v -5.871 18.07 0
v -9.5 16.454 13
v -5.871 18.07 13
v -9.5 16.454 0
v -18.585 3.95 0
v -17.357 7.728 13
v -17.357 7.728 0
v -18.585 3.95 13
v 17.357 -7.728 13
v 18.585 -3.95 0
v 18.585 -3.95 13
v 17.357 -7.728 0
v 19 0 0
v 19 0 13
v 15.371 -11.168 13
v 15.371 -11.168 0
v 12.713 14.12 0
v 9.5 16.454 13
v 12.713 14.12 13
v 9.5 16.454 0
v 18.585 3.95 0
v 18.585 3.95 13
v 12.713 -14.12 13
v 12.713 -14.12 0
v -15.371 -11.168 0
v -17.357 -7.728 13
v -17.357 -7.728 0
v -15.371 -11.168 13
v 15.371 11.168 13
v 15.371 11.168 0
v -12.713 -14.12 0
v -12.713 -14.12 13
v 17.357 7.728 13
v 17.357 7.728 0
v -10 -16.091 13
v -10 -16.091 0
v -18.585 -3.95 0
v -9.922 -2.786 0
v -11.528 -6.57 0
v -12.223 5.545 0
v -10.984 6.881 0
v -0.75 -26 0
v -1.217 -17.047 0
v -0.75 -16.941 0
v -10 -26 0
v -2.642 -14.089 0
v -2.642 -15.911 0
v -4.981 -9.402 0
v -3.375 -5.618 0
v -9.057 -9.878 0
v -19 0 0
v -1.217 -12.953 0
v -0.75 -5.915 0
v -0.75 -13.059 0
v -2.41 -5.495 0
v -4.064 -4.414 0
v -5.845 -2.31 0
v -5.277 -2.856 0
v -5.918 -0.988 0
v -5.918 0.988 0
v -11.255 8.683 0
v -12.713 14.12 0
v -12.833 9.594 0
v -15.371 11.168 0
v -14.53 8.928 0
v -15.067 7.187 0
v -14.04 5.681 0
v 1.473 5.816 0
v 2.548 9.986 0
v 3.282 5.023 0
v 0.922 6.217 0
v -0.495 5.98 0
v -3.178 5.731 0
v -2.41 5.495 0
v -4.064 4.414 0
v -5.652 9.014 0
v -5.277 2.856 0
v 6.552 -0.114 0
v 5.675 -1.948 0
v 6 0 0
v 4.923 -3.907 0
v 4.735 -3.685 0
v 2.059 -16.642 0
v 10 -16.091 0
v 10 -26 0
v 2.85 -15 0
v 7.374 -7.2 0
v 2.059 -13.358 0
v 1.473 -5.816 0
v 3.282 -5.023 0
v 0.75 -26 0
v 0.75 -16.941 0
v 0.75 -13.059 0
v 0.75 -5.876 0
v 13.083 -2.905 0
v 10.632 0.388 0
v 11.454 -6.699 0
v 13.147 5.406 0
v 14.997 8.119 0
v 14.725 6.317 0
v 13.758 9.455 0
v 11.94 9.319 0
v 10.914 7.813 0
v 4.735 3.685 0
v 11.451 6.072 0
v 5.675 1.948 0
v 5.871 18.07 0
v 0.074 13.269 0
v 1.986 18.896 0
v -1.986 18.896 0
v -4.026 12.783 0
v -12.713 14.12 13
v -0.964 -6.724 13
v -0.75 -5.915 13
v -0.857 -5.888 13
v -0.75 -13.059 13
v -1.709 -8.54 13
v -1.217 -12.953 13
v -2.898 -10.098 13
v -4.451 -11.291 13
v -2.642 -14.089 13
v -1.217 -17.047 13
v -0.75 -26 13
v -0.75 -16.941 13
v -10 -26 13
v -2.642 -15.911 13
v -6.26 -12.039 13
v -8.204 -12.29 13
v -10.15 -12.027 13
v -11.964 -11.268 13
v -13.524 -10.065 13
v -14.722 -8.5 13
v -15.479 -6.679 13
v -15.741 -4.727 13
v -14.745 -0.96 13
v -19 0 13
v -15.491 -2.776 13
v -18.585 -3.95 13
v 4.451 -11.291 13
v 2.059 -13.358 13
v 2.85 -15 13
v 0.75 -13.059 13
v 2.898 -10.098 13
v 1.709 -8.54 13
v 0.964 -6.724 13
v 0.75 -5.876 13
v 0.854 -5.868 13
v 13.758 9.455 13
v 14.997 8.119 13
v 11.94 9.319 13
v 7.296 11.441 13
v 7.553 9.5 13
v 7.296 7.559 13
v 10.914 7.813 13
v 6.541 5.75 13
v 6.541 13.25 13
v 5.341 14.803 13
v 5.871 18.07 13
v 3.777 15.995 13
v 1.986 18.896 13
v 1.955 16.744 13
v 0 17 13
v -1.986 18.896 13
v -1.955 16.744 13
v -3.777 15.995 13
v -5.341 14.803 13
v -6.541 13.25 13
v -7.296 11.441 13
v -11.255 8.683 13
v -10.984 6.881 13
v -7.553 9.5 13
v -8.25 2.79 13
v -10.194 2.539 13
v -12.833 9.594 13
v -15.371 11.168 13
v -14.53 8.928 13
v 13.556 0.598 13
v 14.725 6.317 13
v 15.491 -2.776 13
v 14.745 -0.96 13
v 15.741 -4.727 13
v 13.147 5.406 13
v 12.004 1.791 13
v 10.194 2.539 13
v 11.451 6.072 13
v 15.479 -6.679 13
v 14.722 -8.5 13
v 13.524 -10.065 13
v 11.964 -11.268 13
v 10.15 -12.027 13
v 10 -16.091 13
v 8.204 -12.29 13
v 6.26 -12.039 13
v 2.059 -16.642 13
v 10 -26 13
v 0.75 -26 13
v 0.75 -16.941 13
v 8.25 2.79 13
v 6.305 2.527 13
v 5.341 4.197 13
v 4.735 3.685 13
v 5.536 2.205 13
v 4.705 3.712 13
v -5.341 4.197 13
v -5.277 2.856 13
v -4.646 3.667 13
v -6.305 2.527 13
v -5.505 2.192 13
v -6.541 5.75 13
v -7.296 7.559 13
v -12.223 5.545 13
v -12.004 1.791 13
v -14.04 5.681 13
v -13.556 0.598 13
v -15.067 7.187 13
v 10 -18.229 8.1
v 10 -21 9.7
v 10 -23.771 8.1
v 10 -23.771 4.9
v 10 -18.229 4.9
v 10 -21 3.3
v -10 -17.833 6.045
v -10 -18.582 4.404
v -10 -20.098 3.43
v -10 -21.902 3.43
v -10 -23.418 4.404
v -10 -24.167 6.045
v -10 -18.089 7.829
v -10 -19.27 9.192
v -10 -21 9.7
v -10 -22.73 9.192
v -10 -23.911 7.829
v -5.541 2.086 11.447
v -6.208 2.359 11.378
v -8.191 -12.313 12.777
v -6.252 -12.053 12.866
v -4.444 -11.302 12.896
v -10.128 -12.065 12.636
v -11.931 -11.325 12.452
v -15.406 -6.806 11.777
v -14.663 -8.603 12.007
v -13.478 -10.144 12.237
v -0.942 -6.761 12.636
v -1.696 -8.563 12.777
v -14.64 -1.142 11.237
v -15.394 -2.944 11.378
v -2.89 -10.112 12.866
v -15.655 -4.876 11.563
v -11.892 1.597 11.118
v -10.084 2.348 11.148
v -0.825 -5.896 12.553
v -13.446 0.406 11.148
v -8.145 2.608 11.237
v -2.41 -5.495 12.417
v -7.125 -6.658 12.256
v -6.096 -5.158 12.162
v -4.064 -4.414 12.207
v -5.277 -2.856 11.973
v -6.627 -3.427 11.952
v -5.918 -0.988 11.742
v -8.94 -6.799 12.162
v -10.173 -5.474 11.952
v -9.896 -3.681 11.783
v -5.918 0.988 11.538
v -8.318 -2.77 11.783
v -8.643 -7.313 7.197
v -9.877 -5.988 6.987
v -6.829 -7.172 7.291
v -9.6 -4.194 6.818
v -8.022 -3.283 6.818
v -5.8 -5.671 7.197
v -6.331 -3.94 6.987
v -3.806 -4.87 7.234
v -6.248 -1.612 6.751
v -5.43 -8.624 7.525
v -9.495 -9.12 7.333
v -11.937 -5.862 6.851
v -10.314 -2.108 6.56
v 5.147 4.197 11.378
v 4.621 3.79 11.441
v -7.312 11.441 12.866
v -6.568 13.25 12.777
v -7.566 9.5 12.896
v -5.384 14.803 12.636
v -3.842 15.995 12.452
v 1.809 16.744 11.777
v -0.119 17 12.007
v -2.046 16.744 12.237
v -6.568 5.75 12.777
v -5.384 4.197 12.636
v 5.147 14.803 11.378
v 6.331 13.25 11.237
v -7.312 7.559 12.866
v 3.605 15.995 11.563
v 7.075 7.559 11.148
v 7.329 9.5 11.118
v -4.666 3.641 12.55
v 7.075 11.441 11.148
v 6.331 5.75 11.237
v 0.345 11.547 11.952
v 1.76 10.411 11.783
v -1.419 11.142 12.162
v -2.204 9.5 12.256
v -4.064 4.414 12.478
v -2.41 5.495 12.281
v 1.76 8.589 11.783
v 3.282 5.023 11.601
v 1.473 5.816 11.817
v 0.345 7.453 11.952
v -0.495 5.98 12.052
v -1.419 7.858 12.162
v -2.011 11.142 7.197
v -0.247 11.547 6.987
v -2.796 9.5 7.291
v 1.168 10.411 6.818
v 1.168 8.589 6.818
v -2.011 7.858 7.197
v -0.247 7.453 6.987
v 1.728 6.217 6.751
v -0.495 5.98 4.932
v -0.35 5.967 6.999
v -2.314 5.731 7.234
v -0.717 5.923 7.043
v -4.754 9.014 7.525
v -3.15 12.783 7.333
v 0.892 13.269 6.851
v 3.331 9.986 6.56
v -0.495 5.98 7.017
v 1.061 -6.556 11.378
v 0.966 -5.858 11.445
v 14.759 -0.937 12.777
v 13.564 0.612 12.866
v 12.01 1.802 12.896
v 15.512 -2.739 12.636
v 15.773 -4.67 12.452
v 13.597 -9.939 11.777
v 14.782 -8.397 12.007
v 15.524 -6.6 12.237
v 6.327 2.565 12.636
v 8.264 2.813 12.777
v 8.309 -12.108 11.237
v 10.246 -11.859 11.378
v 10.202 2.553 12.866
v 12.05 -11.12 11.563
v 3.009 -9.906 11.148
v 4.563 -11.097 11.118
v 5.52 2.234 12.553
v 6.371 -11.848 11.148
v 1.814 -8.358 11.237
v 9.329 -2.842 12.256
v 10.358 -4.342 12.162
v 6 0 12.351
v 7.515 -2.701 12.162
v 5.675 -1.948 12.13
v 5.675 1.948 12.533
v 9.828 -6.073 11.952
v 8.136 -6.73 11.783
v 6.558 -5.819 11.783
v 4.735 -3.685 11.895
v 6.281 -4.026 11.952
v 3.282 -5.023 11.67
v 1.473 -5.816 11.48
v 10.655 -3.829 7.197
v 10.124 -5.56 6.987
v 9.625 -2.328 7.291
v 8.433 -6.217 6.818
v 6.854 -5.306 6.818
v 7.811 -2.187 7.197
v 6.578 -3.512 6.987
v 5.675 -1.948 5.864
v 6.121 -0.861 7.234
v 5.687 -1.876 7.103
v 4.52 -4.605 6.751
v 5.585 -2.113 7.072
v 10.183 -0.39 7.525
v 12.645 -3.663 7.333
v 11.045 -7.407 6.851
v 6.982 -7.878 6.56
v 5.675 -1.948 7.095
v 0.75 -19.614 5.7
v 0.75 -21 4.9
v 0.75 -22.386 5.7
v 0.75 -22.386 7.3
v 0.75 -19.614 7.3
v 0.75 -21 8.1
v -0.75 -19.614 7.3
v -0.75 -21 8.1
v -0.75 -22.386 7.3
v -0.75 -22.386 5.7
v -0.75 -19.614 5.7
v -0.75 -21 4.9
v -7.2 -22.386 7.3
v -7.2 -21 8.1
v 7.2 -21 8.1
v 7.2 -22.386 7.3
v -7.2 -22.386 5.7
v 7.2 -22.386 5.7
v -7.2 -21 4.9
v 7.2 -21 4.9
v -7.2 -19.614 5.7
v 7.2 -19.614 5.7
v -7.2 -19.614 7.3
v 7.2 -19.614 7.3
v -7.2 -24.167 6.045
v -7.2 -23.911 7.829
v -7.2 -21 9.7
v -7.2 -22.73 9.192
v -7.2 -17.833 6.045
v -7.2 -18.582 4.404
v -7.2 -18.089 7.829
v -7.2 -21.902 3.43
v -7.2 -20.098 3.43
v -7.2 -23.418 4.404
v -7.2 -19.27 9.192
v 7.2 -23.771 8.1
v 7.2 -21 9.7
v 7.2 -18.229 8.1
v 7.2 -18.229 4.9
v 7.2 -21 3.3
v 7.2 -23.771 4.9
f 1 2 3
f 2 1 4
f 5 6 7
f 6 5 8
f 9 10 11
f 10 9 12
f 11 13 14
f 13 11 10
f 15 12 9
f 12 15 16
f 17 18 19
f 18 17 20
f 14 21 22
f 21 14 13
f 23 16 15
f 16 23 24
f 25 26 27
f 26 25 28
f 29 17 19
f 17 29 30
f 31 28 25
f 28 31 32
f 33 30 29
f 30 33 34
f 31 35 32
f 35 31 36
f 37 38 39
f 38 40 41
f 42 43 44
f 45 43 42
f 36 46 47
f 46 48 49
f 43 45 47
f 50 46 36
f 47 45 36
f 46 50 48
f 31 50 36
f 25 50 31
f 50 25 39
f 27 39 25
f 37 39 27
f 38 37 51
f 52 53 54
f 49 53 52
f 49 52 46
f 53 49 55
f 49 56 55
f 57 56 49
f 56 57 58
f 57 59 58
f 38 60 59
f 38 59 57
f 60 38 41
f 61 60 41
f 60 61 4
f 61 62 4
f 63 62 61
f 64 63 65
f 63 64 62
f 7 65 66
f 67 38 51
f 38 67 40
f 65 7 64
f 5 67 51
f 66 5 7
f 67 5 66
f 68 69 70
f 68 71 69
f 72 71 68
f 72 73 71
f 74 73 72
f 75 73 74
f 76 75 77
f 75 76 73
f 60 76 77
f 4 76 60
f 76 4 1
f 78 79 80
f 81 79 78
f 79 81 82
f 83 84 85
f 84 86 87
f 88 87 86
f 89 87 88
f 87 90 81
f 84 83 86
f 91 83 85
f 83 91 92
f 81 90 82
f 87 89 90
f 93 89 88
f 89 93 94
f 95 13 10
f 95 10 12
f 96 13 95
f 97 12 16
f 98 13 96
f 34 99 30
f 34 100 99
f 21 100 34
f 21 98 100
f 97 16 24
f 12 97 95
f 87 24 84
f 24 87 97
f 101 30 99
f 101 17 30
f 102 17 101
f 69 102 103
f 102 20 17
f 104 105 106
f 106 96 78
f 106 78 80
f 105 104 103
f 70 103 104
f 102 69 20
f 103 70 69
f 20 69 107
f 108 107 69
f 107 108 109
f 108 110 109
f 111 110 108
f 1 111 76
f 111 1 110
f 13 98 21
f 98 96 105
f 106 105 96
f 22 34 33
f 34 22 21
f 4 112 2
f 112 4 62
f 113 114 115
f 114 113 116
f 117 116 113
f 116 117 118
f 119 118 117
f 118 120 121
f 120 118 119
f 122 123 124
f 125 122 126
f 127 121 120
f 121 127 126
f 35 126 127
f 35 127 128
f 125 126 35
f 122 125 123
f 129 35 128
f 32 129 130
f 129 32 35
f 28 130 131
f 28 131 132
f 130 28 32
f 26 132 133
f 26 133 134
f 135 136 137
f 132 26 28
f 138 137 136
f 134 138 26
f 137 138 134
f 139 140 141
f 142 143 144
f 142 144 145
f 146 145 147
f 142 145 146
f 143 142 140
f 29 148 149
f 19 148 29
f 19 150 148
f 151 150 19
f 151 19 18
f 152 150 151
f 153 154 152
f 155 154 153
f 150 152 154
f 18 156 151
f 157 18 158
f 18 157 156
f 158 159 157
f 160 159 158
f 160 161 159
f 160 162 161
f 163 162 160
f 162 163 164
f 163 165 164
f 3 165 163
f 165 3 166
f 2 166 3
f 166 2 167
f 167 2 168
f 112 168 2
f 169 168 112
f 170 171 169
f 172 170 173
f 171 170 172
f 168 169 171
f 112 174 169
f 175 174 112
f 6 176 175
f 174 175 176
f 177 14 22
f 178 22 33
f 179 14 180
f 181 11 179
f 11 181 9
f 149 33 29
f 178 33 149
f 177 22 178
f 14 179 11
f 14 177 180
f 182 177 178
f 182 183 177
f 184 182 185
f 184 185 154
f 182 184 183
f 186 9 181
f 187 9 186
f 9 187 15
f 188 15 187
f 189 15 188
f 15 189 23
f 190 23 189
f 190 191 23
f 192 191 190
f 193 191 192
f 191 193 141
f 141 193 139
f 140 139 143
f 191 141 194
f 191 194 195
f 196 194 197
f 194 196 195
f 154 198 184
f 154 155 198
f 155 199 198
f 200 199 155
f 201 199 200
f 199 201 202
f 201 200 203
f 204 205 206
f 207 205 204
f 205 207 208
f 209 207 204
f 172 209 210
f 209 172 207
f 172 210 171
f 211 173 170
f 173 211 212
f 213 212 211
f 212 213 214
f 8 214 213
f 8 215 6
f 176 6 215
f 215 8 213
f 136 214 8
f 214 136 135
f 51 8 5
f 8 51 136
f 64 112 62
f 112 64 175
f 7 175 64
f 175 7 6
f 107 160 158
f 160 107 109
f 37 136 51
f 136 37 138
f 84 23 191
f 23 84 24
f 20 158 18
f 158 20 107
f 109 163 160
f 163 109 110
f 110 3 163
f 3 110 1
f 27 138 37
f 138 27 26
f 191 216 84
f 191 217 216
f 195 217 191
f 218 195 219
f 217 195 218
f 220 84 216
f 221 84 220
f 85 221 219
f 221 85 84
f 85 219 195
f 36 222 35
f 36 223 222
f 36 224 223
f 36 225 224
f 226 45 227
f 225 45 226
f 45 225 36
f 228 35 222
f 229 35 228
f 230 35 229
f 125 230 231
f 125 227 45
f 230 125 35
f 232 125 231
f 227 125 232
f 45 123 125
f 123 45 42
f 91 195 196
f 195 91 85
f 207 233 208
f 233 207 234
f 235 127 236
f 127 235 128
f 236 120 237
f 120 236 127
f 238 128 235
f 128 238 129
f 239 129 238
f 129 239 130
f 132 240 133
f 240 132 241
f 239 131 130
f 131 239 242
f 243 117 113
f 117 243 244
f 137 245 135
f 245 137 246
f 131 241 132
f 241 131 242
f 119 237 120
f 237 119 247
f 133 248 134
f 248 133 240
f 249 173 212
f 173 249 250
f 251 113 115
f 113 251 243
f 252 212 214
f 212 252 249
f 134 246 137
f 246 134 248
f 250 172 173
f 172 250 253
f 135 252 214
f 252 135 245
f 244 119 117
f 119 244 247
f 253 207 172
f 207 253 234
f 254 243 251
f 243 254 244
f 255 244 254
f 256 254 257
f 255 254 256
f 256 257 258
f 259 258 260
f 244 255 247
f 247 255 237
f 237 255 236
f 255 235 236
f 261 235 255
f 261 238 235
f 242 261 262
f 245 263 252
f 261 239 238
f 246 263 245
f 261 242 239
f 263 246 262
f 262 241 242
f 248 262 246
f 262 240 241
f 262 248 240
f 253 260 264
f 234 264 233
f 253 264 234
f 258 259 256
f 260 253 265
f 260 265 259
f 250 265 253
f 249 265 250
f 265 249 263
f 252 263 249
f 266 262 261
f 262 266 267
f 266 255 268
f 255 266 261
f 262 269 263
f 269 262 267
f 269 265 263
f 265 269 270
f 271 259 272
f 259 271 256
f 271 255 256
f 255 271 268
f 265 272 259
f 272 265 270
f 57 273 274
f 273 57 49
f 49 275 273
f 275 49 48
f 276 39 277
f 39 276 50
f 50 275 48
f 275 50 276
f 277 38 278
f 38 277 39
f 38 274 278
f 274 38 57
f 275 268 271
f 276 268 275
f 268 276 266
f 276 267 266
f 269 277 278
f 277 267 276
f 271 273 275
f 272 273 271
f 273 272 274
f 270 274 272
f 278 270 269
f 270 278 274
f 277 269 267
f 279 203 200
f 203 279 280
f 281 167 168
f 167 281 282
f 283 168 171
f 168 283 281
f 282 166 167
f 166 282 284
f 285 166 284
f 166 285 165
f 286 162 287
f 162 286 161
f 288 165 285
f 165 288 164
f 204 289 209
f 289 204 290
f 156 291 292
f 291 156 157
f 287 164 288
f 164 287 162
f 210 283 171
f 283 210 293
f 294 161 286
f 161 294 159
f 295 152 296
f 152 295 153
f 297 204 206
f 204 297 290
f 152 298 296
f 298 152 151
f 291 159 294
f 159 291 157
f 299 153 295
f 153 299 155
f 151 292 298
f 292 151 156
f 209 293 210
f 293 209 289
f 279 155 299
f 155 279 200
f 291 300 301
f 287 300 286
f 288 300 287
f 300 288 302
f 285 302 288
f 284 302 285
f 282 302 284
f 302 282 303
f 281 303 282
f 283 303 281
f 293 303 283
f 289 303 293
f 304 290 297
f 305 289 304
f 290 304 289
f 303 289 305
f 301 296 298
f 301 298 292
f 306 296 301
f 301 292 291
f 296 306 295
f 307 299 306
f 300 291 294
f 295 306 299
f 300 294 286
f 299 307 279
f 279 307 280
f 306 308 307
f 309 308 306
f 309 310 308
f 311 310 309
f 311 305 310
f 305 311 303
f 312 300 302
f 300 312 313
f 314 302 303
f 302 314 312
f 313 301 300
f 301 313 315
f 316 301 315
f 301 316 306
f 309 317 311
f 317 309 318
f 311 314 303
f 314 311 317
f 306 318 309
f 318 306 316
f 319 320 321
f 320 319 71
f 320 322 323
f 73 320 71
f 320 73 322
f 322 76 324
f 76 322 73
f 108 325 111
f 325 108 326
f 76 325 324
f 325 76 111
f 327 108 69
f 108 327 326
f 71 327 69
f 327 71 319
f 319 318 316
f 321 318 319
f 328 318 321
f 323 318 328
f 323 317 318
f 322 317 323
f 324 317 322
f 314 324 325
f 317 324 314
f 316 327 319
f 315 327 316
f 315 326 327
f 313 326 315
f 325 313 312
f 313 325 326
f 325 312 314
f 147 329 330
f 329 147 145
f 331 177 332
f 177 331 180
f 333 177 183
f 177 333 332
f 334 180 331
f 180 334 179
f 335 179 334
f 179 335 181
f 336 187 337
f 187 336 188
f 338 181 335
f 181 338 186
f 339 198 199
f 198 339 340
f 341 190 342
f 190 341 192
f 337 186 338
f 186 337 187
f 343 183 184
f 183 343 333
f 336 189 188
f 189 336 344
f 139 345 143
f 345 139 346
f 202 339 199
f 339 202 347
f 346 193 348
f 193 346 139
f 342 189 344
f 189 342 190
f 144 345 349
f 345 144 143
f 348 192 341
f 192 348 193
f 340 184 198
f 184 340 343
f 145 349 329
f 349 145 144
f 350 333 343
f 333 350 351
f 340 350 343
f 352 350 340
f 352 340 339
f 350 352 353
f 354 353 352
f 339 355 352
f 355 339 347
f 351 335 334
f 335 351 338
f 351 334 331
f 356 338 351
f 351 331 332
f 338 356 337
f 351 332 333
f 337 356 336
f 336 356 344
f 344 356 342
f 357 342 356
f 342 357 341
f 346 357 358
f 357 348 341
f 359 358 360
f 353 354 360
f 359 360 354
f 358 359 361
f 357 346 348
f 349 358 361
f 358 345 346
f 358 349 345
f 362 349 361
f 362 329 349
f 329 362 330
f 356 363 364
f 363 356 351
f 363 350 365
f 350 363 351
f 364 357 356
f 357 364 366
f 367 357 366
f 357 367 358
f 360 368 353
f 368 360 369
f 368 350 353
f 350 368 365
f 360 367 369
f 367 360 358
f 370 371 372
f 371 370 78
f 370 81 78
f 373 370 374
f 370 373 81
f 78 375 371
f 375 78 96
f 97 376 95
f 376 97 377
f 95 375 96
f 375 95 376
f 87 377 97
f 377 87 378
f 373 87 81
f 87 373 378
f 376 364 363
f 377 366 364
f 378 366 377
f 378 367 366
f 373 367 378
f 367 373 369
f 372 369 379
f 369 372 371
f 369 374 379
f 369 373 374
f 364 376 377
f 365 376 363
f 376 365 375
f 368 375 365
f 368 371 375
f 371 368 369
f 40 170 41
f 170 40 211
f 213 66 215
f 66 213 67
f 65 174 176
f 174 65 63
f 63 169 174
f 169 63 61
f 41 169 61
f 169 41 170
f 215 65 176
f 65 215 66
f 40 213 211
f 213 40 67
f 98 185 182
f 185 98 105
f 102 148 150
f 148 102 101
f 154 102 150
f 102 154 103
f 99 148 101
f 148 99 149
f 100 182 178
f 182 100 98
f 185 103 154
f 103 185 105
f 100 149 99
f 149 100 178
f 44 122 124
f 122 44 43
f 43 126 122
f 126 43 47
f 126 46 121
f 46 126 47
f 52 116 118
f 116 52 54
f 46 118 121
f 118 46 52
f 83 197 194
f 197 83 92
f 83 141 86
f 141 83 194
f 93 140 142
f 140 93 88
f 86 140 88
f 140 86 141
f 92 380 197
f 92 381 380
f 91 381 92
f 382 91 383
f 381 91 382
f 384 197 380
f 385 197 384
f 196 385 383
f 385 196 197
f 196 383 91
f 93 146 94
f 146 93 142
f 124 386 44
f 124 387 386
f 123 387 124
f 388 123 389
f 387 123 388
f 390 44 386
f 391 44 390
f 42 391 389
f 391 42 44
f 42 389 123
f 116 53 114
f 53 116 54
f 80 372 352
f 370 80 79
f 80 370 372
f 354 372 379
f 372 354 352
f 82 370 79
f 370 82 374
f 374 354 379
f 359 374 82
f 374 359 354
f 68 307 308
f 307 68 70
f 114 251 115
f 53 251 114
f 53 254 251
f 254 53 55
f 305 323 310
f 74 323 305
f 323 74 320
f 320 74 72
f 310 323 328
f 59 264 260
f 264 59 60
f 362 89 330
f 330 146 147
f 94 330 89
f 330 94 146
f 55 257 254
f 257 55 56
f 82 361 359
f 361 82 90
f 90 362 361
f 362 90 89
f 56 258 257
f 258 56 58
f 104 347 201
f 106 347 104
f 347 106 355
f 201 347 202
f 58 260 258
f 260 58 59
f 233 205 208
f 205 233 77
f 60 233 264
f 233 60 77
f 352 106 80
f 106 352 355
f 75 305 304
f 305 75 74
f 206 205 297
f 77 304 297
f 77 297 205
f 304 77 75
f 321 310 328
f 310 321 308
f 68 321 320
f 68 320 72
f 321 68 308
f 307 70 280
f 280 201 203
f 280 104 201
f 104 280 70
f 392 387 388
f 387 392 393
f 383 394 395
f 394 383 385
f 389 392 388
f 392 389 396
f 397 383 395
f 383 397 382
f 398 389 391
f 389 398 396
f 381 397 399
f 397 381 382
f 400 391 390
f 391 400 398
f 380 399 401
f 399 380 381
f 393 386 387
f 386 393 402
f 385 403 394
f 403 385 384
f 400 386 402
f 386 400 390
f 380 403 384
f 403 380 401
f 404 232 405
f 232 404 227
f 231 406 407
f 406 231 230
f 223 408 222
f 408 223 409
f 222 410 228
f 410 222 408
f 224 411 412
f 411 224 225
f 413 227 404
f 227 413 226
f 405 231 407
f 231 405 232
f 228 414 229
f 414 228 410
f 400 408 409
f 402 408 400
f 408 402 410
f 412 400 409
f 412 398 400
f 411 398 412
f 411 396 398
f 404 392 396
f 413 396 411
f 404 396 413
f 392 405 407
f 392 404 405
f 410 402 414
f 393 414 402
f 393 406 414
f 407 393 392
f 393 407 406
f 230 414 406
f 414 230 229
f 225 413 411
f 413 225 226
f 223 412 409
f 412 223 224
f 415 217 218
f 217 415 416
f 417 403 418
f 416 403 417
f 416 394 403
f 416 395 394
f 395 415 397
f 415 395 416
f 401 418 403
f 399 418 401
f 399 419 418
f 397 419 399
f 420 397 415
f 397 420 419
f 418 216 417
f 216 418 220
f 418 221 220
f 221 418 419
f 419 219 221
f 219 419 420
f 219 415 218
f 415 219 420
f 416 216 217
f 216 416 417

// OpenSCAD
// file: shapes.scad
// 2D basic shapes
module inverseQuarterCircle(r) {
    difference() {
        square([2*r,2*r]);
        translate([r,r])circle(r=r);
        translate([r,0])square([r,2*r]);
        translate([0,r])square([2*r,r]);
    }
}


module catenary(length=100, width=5, a = 25, step=1) {
    function f(x) = width-(a*cosh(x/length)-a);
    for (i = [-length/2 + step : step : length/2]) {
        //echo("i = ", i, " f(i) = ", f(i));
        polygon([[i-step,0],[i,0],[i,f(i)],[i-step,f(i-step)]]);
    }
}

module trapezoid(base, top, h) {
    polygon([[0,-base/2],[0,base/2],[h,top/2],[h,-top/2]]);
}

module arc(w=1, r, angle) {
    difference() {
        circle(r=r+w/2);
        circle(r=r-w/2);
        rotate(angle/2)translate([-r-w/2,0])square([r*2+w,r*2+w]);
        rotate(180-angle/2)translate([-r-w/2,0])square([r*2+w,r*2+w]);
    }
}

// 3D basic shapes

module roundedCube(size = [10,10,10],radius=1) {
    hull() {
        // bottom
        translate([size[0]-radius,size[1]-radius,radius])sphere(r=radius,center=true);
        translate([size[0]-radius,radius,radius])sphere(r=radius,center=true);
        translate([radius,size[1]-radius,radius])sphere(r=radius,center=true);
        translate([radius,radius,radius])sphere(r=radius,center=true);
        // top
        translate([size[0]-radius,size[1]-radius,size[2]-radius])sphere(r=radius,center=true);
        translate([size[0]-radius,radius,size[2]-radius])sphere(r=radius,center=true);
        translate([radius,size[1]-radius,size[2]-radius])sphere(r=radius,center=true);
        translate([radius,radius,size[2]-radius])sphere(r=radius,center=true);

    }
}

module roundedCylinder(d, h,rr=1, fn=$fn) {
    translate([0,0,rr])minkowski() {
        cylinder(d=d-2*rr, h=h-2*rr, $fn=fn);
        sphere(r=rr, center = true);
    }
}

module roundedBox(size = [1,1,1],radius=1) {
    hull() {
        translate([size[0]-radius,size[1]-radius,size[2]/2])cylinder(r=radius,h=size[2],center=true);
        translate([size[0]-radius,radius,size[2]/2])cylinder(r=radius,h=size[2],center=true);
        translate([radius,size[1]-radius,size[2]/2])cylinder(r=radius,h=size[2],center=true);
        translate([radius,radius,size[2]/2])cylinder(r=radius,h=size[2],center=true);
    }
}
// file: BearingScrew.scad
include <configuration.scad>
include <shapes.scad>


pi = 3.1415926536;

module BearingScrew(axis_dia = 8, bearing_od=13, bearing_id=4, bearing_h=5, lead = 3) {
    mount_dia = axis_dia + bearing_od*2+4;
    height=13;
    clamp_width = 20;
    clamp_length = 26;
    clamp_split = 1.5;
    tension_distance = 1;
    
    thread_angle = atan(lead/(8*pi));
    
    translate([0,0,height])rotate([180,0,0]) {
            difference() {
            union() {
                // body
                cylinder(d=mount_dia, h=height);
                // clamp
                translate([-clamp_width/2,0,0])cube(size=[clamp_width, clamp_length, height]);
            }
            // Split
            translate([-clamp_split/2,0,0])cube(size=[clamp_split, clamp_length, height]);
            // Space for axis
            cylinder(d=axis_dia + 4, h=height);
            for (a=[60:120:360]) {
                rotate([0,thread_angle,a]) {
                    // bearing holes
                    translate([0,(axis_dia + bearing_od)/2 - tension_distance, -bearing_h+1 ])cylinder(d=bearing_od + 2, h=bearing_h);
                    // bearing screw holes
                    translate([0,(axis_dia + bearing_od)/2 - tension_distance, -m4_dia ])cylinder(d=m4_dia, h=height*2);
                    // bearing nut holes
                    translate([0,(axis_dia + bearing_od)/2 - tension_distance, 6 ])rotate([0,0,-thread_angle])cylinder(d=m4_nut_dia, h=height, $fn=6);        
                }
                // Mount holes
                rotate([0,0,a-60])translate([0,mount_dia/2-4, -1])cylinder(d=m4_dia, h=height+2);
            }
            // Larger mount hole in clamp
            for (d=[-clamp_split/2,clamp_split/2]) {
                translate([d,mount_dia/2-4, 0])cylinder(d=m4_dia, h=height);
            }
            // clamp screw
            translate([-(clamp_width/2)-1,clamp_length - 5,height/2])rotate([0,90,0])cylinder(d=m3_dia, h=clamp_width+2);
            // screw head
            translate([-(clamp_width/2)-1,clamp_length - 5,height/2])rotate([0,90,0])cylinder(d=m3_nut_dia, h=m3_nut_height+1);
            // nut
            mirror(1,0,0)translate([-(clamp_width/2)-1,clamp_length - 5,height/2])rotate([0,90,0])cylinder(d=m3_nut_dia, h=m3_nut_height+1,$fn=6);

        }
        // print support
//       for (a=[60:120:360]) {
//            color([1,0,0,1])rotate([0,thread_angle,a]) {
//                 // bearing nut holes
//                translate([0,(axis_dia + bearing_od)/2 - tension_distance, 6 ])rotate([0,0,-thread_angle])cylinder(d=m4_nut_dia, h=print_layer_height);        
//            }
//         }
     }
}

module BearingScrewMount(axis_dia = 8, bearing_od=13, thickness=3) {
    mount_dia = axis_dia + bearing_od*2+4;

    base_width = 25;
    
    translate([0,0,thickness])rotate([90,0,0])difference() {
        union() {
            // plate
            hull() {
                translate([0, (mount_dia)/2+thickness+1,0])cylinder(d=mount_dia, h=thickness);
                translate([-mount_dia/2,0,0])cube([mount_dia, thickness, thickness]);
            }
            // bump around axis
            translate([0, (mount_dia)/2+thickness+1,-2])roundedCylinder(d=axis_dia+4, h=thickness+4, rr=3);
            // mount plate
            rotate([90,0,0])translate([-mount_dia/2,-(base_width-thickness)/2,0])roundedBox([mount_dia, base_width, thickness], radius=2);
            // base
            translate([0,-5, thickness/2])intersection() {
                rotate([90,0,0])translate([-mount_dia/2,-(base_width)/2,-base_width-5+thickness])roundedBox([mount_dia, base_width, base_width], radius=2);
                rotate([45,0,0])translate([-mount_dia/2,-(base_width)/2,-(base_width)/2])roundedCube([mount_dia, base_width, base_width], radius=2);
            }
        }
        // base
        translate([-(base_width/2+thickness),0,thickness])roundedCube([mount_dia-2*thickness, base_width/2+1, base_width], radius=2);
        // base
        translate([-(base_width/2+thickness),0,-base_width])roundedCube([mount_dia-2*thickness, base_width/2+1, base_width], radius=2);
        // axis hole
        translate([0, (mount_dia)/2+thickness+1,-2])cylinder(d=axis_dia+1, h=thickness+4);
        translate([0, (mount_dia)/2+thickness+1,0])for (a=[0:120:359]) {
            // Mount holes
            rotate([0,0,a+30])translate([0,mount_dia/2-4, -1])cylinder(d=m4_dia, h=thickness+2);
        }
        // Mount holes
        for (i=[1,-1]) {
            for (j=[1,-1]) {
                translate([i*10,1,j*8+thickness/2])rotate([90,0,0])cylinder(d=m4_dia, h=thickness+2);
            }
        }
    }
}

module BearingScrewAssembly() {
    mount_dia = 38;
    translate([0,0,3])rotate([90,0,0])BearingScrewMount();
    translate([0,-mount_dia/2-7,3])rotate([0,0,90])BearingScrew();
    translate([0,-mount_dia/2-7,0])rotate([0,180,90])BearingScrew();
}

//$fs=1;
//$fa=6;
BearingScrew();
// file: BearingMount.scad
include <configuration.scad>
include <shapes.scad>


module screwMount(thickness = 5, hex=true) {
    difference() {
            hull() {
            translate([-thickness,-(m3_nut_dia)/2-1.5,0])rotate([0,90,0])cylinder(d=m3_nut_dia+3, h=thickness);
            translate([-thickness/2,-0.5,0])cube(size=[thickness,1, m3_nut_dia+12], center=true);
        }
        // screw
        translate([-thickness,-(m3_nut_dia)/2-1.5,0])rotate([0,90,0])cylinder(d=m3_dia, h=thickness);
        //nut
        if (hex) {
            translate([-thickness,-(m3_nut_dia)/2-1.5,0])rotate([0,90,0])cylinder(d=m3_nut_dia, h=2, $fn=6);
        }
        else {
            translate([-thickness,-(m3_nut_dia)/2-1.5,0])rotate([0,90,0])cylinder(d=m3_nut_dia, h=2);
        }
    }
}

module BearingTube(bearing_od = 15, bearing_h=24, bearing_count=3, wall_thickness = 3) {
    ring_h = 2;
    mount_height = (bearing_h+ring_h)*bearing_count+ring_h;
    module lockRing(h=2){
        rotate_extrude()translate([bearing_od/2-1,1])trapezoid(top=h, base=0.5, h=1);
    }

    difference() {
        union() {
           // tube
            difference() {
                cylinder(d=bearing_od + 2*wall_thickness, h=mount_height);
                cylinder(d=bearing_od, h=mount_height);
                
            }
            // separators for bearings
            for (i=[0:1:bearing_count]) {
                translate([0,0,i*(bearing_h+ring_h)])lockRing(ring_h);
            }
            difference() {
                cylinder(d=bearing_od, h=1);
                cylinder(d=bearing_od-2, h=1);
                
            }
        }
        // slice half off
        translate([0,-bearing_od/2 - wall_thickness,-1])cube([bearing_od+2*wall_thickness, bearing_od+2*wall_thickness, mount_height+2]);
 
    }
    
}

module BearingMount(bearing_od = 15, bearing_h=24, bearing_count=3, hex = true) {
    wall_thickness = 3;
    mount_height = (bearing_h+2)*bearing_count+2;
    
    
    BearingTube(bearing_od = bearing_od, bearing_h = bearing_h, bearing_count = bearing_count, wall_thickness = wall_thickness);
    translate([0,-bearing_od/2,15])screwMount();
    translate([0,-bearing_od/2,mount_height-15])screwMount();
    translate([0,bearing_od/2,15])mirror([0,1,0])screwMount();
    translate([0,bearing_od/2,mount_height-15])mirror([0,1,0])screwMount();
}
// file: configuration.scad
// 
drive_rod_diameter = 8;
// Guidance rods and linear bearings dimensions
rod_diameter = 8;
bearing_diameter = 15;
bearing_length = 24;

arm1_length = 150; // Length of first arm
arm2_length = 150; // Length of second arm
connector_length = 60; // length of pipe connector of first arm
tool_dia = 30; // Diameter of tool head

rodspacing = 175;		// Distance between rods:	175 standard, 190 wide
platform_height = 420;
PVC_pipe_OD = 32;		// Default 32mm
PVC_pipe_ID = 26;	// measure pipe ID to adjust
Drive_pipe_OD = 22.5;	// Drive pipe outter diameter: 22mm default
baseplate_thickness = 18.5; // thickness of the base plate

function nutDia(nominalDiameter) = nominalDiameter*1.8 + 1;
function boltDia(nominalDiameter) = nominalDiameter + 0.2;
function nutHeight(nominalDiameter) = nominalDiameter*0.8 + 0.4;
function nutSlot(nominalDiameter) = nominalDiameter*1.8 + 0.4;

pi = 3.1415926536;

m3_dia = boltDia(3);
m3_nut_dia = nutDia(3);
m3_nut_slot = nutSlot(3);
m3_nut_height = nutHeight(3);

m4_dia = boltDia(4);
m4_nut_dia = nutDia(4);
m4_nut_height = nutHeight(4);

m8_dia = boltDia(8);
m8_nut_dia = nutDia(8);
m8_nut_height = nutHeight(8);

print_layer_height = 0.25;
// main file
include <configuration.scad>
include <MCAD/teardrop.scad>
include <BearingMount.scad>
include <BearingScrew.scad>

module BracketBase(bearing_diameter = 15, bearing_length = 24){
	difference(){
		union(){
			translate([(rodspacing)/2,0,0])
				rotate([0,0,90])BracketBearingMount(bearing_diameter = bearing_diameter, bearing_length = bearing_length);
			translate([(rodspacing)/-2,0,0])
				rotate([0,0,-90])mirror()BracketBearingMount(bearing_diameter = bearing_diameter, bearing_length = bearing_length);
			difference(){
			  union(){
				translate([0,-14.5,25]){
					cube([rodspacing,3,50],center=true);
						
				}
			
				translate([0,-25.5,1.5]){
					intersection(){
						cube ([rodspacing+20, 25, 3],center=true);
						translate([0,rodspacing*1.5-6,-2])	
							cylinder(r=rodspacing*1.5, h=5);

					}			
				}
			  }
		
			}		
			cylinder(r=23,h=50);
		}

		cylinder(r=19,h=50);
		translate([-25,-13,0])
		cube([50,50,50]);

		translate([45,-30,22])
			rotate([0,0,90])
				teardrop(16, 50, 90);
				
		translate([-45,-30,22])
			rotate([0,0,90])
				teardrop(16, 50, 90);
				
		// Magnet hole
//		#translate([rodspacing/-2+LMxUU/1.5, LMxUU*-1.756, 0])
//			cylinder(d=5, h=3);
	}
}

module BracketBearingMount(bearing_diameter = 15, bearing_length = 24) {
    bearing_count=3;
    mount_height = (bearing_length+2)*3+2;
    wall_thickness = 3;

    difference() {
        // bearing tube base
        hull() {
            translate([-13+bearing_diameter/2, 0, 0])cylinder(d=bearing_diameter + 2*wall_thickness, h = mount_height);
            cylinder(d=bearing_diameter + 2*wall_thickness, h = mount_height);
        }
        cylinder(d=bearing_diameter, h = mount_height);
       // slice half off
        translate([0,-bearing_diameter/2 - wall_thickness,-1])cube([bearing_diameter+2*wall_thickness, bearing_diameter+2*wall_thickness, mount_height+2]);
    }
    // bearing tube
    BearingTube(bearing_od = bearing_diameter, bearing_h=bearing_length, bearing_count=bearing_count, wall_thickness = wall_thickness);
    // screw mounts
    translate([0,-bearing_diameter/2,15])screwMount(thickness = 11, hex=false);
    translate([0,-bearing_diameter/2,mount_height-15])screwMount(thickness = 11, hex=false);
    translate([0,bearing_diameter/2,15])mirror([0,1,0])screwMount(thickness = 13, hex=false);
    translate([0,bearing_diameter/2,mount_height-15])mirror([0,1,0])screwMount(thickness = 11, hex=false);
    //Limit switch interruptors
    #hull() {
        translate([-bearing_diameter/2-5,0,mount_height-0.5])rotate([90,0,0])cylinder(d=1, h=1,center = true);
        translate([-bearing_diameter/2-15,0,mount_height-8])rotate([90,0,0])cylinder(d=1, h=1,center = true);
        translate([-bearing_diameter/2-5,0,mount_height-25])rotate([90,0,0])cylinder(d=1, h=1,center = true);
        translate([-bearing_diameter/2-15,0,mount_height-0.5])rotate([90,0,0])cylinder(d=1, h=1,center = true);
    }
    #hull() {
        translate([-bearing_diameter/2-5,0,0.5])rotate([90,0,0])cylinder(d=1, h=1,center = true);
        translate([-bearing_diameter/2-15,0,8])rotate([90,0,0])cylinder(d=1, h=1,center = true);
        translate([-bearing_diameter/2-5,0,25])rotate([90,0,0])cylinder(d=1, h=1,center = true);
        translate([-bearing_diameter/2-15,0,0.5])rotate([90,0,0])cylinder(d=1, h=1,center = true);
    }
}


module ZMountBracketIntegrated() {
    translate([0,-40,0])rotate([0,0,90])BearingScrew();
    difference() {
        union() {
            BracketBase(16);
            translate([-12,-28,0])cube([24,15,13]);
        }
        translate([0,-40,0])cylinder(d=37, h=13);
        cylinder(r=20, h=13);
        translate([(rodspacing)/2-(9+m3_nut_dia/2),-12,15])rotate([90,0,0])cylinder(d=m3_nut_dia, h=20);
        translate([-(rodspacing)/2+(9+m3_nut_dia/2),-12,15])rotate([90,0,0])cylinder(d=m3_nut_dia, h=20);
    }
}

module ZMountBracket(bearing_diameter = 15, bearing_length = 24) {
//    screw_
    difference() {
        union() {
            BracketBase(bearing_diameter = bearing_diameter, bearing_length = bearing_length);
            // bearingscrew mount
            hull() {
                translate([0,-40,0])cylinder(d=39, h=6);
                translate([-19.5,-15,0])cube([39,1,6]);
            }
        }
        // Space for bearingScrew
        translate([0,-40,6])cylinder(d=39.5, h=20);
        // Printability
        translate([0,-40,26])cylinder(d1=39.5, d2=34.5, h=6);
        // axis
        translate([0,-40,0])cylinder(d=12, h=20);
        // drive tube
		cylinder(r=19,h=50);
        translate([0,-40,0])for (a=[0:120:359]) {
            // Mount holes
            rotate([0,0,a])translate([0,15, -1])cylinder(d=m4_dia, h=20);
        }
        // bearing mount screws
        translate([(rodspacing)/2-(bearing_diameter/2+1.5+m3_nut_dia/2),-9,15])rotate([90,0,0])cylinder(d=m3_nut_dia, h=20);
        translate([-(rodspacing)/2+(bearing_diameter/2+1.5+m3_nut_dia/2),-9,15])rotate([90,0,0])cylinder(d=m3_nut_dia, h=20);
    }
}

//$fa=3;
//$fs=0.2;
//ZMountBracket(bearing_diameter = 21, bearing_length = 30);

//color([1,0,0,1])translate([0,-50,0])
//ZMountBracket(bearing_diameter = 15, bearing_length = 24);
//%translate([0,-40,6])rotate([0,0,60])BearingScrew();

//%color([1,0,1,0.5])cylinder(d=Drive_pipe_OD, h=200, center=true);
